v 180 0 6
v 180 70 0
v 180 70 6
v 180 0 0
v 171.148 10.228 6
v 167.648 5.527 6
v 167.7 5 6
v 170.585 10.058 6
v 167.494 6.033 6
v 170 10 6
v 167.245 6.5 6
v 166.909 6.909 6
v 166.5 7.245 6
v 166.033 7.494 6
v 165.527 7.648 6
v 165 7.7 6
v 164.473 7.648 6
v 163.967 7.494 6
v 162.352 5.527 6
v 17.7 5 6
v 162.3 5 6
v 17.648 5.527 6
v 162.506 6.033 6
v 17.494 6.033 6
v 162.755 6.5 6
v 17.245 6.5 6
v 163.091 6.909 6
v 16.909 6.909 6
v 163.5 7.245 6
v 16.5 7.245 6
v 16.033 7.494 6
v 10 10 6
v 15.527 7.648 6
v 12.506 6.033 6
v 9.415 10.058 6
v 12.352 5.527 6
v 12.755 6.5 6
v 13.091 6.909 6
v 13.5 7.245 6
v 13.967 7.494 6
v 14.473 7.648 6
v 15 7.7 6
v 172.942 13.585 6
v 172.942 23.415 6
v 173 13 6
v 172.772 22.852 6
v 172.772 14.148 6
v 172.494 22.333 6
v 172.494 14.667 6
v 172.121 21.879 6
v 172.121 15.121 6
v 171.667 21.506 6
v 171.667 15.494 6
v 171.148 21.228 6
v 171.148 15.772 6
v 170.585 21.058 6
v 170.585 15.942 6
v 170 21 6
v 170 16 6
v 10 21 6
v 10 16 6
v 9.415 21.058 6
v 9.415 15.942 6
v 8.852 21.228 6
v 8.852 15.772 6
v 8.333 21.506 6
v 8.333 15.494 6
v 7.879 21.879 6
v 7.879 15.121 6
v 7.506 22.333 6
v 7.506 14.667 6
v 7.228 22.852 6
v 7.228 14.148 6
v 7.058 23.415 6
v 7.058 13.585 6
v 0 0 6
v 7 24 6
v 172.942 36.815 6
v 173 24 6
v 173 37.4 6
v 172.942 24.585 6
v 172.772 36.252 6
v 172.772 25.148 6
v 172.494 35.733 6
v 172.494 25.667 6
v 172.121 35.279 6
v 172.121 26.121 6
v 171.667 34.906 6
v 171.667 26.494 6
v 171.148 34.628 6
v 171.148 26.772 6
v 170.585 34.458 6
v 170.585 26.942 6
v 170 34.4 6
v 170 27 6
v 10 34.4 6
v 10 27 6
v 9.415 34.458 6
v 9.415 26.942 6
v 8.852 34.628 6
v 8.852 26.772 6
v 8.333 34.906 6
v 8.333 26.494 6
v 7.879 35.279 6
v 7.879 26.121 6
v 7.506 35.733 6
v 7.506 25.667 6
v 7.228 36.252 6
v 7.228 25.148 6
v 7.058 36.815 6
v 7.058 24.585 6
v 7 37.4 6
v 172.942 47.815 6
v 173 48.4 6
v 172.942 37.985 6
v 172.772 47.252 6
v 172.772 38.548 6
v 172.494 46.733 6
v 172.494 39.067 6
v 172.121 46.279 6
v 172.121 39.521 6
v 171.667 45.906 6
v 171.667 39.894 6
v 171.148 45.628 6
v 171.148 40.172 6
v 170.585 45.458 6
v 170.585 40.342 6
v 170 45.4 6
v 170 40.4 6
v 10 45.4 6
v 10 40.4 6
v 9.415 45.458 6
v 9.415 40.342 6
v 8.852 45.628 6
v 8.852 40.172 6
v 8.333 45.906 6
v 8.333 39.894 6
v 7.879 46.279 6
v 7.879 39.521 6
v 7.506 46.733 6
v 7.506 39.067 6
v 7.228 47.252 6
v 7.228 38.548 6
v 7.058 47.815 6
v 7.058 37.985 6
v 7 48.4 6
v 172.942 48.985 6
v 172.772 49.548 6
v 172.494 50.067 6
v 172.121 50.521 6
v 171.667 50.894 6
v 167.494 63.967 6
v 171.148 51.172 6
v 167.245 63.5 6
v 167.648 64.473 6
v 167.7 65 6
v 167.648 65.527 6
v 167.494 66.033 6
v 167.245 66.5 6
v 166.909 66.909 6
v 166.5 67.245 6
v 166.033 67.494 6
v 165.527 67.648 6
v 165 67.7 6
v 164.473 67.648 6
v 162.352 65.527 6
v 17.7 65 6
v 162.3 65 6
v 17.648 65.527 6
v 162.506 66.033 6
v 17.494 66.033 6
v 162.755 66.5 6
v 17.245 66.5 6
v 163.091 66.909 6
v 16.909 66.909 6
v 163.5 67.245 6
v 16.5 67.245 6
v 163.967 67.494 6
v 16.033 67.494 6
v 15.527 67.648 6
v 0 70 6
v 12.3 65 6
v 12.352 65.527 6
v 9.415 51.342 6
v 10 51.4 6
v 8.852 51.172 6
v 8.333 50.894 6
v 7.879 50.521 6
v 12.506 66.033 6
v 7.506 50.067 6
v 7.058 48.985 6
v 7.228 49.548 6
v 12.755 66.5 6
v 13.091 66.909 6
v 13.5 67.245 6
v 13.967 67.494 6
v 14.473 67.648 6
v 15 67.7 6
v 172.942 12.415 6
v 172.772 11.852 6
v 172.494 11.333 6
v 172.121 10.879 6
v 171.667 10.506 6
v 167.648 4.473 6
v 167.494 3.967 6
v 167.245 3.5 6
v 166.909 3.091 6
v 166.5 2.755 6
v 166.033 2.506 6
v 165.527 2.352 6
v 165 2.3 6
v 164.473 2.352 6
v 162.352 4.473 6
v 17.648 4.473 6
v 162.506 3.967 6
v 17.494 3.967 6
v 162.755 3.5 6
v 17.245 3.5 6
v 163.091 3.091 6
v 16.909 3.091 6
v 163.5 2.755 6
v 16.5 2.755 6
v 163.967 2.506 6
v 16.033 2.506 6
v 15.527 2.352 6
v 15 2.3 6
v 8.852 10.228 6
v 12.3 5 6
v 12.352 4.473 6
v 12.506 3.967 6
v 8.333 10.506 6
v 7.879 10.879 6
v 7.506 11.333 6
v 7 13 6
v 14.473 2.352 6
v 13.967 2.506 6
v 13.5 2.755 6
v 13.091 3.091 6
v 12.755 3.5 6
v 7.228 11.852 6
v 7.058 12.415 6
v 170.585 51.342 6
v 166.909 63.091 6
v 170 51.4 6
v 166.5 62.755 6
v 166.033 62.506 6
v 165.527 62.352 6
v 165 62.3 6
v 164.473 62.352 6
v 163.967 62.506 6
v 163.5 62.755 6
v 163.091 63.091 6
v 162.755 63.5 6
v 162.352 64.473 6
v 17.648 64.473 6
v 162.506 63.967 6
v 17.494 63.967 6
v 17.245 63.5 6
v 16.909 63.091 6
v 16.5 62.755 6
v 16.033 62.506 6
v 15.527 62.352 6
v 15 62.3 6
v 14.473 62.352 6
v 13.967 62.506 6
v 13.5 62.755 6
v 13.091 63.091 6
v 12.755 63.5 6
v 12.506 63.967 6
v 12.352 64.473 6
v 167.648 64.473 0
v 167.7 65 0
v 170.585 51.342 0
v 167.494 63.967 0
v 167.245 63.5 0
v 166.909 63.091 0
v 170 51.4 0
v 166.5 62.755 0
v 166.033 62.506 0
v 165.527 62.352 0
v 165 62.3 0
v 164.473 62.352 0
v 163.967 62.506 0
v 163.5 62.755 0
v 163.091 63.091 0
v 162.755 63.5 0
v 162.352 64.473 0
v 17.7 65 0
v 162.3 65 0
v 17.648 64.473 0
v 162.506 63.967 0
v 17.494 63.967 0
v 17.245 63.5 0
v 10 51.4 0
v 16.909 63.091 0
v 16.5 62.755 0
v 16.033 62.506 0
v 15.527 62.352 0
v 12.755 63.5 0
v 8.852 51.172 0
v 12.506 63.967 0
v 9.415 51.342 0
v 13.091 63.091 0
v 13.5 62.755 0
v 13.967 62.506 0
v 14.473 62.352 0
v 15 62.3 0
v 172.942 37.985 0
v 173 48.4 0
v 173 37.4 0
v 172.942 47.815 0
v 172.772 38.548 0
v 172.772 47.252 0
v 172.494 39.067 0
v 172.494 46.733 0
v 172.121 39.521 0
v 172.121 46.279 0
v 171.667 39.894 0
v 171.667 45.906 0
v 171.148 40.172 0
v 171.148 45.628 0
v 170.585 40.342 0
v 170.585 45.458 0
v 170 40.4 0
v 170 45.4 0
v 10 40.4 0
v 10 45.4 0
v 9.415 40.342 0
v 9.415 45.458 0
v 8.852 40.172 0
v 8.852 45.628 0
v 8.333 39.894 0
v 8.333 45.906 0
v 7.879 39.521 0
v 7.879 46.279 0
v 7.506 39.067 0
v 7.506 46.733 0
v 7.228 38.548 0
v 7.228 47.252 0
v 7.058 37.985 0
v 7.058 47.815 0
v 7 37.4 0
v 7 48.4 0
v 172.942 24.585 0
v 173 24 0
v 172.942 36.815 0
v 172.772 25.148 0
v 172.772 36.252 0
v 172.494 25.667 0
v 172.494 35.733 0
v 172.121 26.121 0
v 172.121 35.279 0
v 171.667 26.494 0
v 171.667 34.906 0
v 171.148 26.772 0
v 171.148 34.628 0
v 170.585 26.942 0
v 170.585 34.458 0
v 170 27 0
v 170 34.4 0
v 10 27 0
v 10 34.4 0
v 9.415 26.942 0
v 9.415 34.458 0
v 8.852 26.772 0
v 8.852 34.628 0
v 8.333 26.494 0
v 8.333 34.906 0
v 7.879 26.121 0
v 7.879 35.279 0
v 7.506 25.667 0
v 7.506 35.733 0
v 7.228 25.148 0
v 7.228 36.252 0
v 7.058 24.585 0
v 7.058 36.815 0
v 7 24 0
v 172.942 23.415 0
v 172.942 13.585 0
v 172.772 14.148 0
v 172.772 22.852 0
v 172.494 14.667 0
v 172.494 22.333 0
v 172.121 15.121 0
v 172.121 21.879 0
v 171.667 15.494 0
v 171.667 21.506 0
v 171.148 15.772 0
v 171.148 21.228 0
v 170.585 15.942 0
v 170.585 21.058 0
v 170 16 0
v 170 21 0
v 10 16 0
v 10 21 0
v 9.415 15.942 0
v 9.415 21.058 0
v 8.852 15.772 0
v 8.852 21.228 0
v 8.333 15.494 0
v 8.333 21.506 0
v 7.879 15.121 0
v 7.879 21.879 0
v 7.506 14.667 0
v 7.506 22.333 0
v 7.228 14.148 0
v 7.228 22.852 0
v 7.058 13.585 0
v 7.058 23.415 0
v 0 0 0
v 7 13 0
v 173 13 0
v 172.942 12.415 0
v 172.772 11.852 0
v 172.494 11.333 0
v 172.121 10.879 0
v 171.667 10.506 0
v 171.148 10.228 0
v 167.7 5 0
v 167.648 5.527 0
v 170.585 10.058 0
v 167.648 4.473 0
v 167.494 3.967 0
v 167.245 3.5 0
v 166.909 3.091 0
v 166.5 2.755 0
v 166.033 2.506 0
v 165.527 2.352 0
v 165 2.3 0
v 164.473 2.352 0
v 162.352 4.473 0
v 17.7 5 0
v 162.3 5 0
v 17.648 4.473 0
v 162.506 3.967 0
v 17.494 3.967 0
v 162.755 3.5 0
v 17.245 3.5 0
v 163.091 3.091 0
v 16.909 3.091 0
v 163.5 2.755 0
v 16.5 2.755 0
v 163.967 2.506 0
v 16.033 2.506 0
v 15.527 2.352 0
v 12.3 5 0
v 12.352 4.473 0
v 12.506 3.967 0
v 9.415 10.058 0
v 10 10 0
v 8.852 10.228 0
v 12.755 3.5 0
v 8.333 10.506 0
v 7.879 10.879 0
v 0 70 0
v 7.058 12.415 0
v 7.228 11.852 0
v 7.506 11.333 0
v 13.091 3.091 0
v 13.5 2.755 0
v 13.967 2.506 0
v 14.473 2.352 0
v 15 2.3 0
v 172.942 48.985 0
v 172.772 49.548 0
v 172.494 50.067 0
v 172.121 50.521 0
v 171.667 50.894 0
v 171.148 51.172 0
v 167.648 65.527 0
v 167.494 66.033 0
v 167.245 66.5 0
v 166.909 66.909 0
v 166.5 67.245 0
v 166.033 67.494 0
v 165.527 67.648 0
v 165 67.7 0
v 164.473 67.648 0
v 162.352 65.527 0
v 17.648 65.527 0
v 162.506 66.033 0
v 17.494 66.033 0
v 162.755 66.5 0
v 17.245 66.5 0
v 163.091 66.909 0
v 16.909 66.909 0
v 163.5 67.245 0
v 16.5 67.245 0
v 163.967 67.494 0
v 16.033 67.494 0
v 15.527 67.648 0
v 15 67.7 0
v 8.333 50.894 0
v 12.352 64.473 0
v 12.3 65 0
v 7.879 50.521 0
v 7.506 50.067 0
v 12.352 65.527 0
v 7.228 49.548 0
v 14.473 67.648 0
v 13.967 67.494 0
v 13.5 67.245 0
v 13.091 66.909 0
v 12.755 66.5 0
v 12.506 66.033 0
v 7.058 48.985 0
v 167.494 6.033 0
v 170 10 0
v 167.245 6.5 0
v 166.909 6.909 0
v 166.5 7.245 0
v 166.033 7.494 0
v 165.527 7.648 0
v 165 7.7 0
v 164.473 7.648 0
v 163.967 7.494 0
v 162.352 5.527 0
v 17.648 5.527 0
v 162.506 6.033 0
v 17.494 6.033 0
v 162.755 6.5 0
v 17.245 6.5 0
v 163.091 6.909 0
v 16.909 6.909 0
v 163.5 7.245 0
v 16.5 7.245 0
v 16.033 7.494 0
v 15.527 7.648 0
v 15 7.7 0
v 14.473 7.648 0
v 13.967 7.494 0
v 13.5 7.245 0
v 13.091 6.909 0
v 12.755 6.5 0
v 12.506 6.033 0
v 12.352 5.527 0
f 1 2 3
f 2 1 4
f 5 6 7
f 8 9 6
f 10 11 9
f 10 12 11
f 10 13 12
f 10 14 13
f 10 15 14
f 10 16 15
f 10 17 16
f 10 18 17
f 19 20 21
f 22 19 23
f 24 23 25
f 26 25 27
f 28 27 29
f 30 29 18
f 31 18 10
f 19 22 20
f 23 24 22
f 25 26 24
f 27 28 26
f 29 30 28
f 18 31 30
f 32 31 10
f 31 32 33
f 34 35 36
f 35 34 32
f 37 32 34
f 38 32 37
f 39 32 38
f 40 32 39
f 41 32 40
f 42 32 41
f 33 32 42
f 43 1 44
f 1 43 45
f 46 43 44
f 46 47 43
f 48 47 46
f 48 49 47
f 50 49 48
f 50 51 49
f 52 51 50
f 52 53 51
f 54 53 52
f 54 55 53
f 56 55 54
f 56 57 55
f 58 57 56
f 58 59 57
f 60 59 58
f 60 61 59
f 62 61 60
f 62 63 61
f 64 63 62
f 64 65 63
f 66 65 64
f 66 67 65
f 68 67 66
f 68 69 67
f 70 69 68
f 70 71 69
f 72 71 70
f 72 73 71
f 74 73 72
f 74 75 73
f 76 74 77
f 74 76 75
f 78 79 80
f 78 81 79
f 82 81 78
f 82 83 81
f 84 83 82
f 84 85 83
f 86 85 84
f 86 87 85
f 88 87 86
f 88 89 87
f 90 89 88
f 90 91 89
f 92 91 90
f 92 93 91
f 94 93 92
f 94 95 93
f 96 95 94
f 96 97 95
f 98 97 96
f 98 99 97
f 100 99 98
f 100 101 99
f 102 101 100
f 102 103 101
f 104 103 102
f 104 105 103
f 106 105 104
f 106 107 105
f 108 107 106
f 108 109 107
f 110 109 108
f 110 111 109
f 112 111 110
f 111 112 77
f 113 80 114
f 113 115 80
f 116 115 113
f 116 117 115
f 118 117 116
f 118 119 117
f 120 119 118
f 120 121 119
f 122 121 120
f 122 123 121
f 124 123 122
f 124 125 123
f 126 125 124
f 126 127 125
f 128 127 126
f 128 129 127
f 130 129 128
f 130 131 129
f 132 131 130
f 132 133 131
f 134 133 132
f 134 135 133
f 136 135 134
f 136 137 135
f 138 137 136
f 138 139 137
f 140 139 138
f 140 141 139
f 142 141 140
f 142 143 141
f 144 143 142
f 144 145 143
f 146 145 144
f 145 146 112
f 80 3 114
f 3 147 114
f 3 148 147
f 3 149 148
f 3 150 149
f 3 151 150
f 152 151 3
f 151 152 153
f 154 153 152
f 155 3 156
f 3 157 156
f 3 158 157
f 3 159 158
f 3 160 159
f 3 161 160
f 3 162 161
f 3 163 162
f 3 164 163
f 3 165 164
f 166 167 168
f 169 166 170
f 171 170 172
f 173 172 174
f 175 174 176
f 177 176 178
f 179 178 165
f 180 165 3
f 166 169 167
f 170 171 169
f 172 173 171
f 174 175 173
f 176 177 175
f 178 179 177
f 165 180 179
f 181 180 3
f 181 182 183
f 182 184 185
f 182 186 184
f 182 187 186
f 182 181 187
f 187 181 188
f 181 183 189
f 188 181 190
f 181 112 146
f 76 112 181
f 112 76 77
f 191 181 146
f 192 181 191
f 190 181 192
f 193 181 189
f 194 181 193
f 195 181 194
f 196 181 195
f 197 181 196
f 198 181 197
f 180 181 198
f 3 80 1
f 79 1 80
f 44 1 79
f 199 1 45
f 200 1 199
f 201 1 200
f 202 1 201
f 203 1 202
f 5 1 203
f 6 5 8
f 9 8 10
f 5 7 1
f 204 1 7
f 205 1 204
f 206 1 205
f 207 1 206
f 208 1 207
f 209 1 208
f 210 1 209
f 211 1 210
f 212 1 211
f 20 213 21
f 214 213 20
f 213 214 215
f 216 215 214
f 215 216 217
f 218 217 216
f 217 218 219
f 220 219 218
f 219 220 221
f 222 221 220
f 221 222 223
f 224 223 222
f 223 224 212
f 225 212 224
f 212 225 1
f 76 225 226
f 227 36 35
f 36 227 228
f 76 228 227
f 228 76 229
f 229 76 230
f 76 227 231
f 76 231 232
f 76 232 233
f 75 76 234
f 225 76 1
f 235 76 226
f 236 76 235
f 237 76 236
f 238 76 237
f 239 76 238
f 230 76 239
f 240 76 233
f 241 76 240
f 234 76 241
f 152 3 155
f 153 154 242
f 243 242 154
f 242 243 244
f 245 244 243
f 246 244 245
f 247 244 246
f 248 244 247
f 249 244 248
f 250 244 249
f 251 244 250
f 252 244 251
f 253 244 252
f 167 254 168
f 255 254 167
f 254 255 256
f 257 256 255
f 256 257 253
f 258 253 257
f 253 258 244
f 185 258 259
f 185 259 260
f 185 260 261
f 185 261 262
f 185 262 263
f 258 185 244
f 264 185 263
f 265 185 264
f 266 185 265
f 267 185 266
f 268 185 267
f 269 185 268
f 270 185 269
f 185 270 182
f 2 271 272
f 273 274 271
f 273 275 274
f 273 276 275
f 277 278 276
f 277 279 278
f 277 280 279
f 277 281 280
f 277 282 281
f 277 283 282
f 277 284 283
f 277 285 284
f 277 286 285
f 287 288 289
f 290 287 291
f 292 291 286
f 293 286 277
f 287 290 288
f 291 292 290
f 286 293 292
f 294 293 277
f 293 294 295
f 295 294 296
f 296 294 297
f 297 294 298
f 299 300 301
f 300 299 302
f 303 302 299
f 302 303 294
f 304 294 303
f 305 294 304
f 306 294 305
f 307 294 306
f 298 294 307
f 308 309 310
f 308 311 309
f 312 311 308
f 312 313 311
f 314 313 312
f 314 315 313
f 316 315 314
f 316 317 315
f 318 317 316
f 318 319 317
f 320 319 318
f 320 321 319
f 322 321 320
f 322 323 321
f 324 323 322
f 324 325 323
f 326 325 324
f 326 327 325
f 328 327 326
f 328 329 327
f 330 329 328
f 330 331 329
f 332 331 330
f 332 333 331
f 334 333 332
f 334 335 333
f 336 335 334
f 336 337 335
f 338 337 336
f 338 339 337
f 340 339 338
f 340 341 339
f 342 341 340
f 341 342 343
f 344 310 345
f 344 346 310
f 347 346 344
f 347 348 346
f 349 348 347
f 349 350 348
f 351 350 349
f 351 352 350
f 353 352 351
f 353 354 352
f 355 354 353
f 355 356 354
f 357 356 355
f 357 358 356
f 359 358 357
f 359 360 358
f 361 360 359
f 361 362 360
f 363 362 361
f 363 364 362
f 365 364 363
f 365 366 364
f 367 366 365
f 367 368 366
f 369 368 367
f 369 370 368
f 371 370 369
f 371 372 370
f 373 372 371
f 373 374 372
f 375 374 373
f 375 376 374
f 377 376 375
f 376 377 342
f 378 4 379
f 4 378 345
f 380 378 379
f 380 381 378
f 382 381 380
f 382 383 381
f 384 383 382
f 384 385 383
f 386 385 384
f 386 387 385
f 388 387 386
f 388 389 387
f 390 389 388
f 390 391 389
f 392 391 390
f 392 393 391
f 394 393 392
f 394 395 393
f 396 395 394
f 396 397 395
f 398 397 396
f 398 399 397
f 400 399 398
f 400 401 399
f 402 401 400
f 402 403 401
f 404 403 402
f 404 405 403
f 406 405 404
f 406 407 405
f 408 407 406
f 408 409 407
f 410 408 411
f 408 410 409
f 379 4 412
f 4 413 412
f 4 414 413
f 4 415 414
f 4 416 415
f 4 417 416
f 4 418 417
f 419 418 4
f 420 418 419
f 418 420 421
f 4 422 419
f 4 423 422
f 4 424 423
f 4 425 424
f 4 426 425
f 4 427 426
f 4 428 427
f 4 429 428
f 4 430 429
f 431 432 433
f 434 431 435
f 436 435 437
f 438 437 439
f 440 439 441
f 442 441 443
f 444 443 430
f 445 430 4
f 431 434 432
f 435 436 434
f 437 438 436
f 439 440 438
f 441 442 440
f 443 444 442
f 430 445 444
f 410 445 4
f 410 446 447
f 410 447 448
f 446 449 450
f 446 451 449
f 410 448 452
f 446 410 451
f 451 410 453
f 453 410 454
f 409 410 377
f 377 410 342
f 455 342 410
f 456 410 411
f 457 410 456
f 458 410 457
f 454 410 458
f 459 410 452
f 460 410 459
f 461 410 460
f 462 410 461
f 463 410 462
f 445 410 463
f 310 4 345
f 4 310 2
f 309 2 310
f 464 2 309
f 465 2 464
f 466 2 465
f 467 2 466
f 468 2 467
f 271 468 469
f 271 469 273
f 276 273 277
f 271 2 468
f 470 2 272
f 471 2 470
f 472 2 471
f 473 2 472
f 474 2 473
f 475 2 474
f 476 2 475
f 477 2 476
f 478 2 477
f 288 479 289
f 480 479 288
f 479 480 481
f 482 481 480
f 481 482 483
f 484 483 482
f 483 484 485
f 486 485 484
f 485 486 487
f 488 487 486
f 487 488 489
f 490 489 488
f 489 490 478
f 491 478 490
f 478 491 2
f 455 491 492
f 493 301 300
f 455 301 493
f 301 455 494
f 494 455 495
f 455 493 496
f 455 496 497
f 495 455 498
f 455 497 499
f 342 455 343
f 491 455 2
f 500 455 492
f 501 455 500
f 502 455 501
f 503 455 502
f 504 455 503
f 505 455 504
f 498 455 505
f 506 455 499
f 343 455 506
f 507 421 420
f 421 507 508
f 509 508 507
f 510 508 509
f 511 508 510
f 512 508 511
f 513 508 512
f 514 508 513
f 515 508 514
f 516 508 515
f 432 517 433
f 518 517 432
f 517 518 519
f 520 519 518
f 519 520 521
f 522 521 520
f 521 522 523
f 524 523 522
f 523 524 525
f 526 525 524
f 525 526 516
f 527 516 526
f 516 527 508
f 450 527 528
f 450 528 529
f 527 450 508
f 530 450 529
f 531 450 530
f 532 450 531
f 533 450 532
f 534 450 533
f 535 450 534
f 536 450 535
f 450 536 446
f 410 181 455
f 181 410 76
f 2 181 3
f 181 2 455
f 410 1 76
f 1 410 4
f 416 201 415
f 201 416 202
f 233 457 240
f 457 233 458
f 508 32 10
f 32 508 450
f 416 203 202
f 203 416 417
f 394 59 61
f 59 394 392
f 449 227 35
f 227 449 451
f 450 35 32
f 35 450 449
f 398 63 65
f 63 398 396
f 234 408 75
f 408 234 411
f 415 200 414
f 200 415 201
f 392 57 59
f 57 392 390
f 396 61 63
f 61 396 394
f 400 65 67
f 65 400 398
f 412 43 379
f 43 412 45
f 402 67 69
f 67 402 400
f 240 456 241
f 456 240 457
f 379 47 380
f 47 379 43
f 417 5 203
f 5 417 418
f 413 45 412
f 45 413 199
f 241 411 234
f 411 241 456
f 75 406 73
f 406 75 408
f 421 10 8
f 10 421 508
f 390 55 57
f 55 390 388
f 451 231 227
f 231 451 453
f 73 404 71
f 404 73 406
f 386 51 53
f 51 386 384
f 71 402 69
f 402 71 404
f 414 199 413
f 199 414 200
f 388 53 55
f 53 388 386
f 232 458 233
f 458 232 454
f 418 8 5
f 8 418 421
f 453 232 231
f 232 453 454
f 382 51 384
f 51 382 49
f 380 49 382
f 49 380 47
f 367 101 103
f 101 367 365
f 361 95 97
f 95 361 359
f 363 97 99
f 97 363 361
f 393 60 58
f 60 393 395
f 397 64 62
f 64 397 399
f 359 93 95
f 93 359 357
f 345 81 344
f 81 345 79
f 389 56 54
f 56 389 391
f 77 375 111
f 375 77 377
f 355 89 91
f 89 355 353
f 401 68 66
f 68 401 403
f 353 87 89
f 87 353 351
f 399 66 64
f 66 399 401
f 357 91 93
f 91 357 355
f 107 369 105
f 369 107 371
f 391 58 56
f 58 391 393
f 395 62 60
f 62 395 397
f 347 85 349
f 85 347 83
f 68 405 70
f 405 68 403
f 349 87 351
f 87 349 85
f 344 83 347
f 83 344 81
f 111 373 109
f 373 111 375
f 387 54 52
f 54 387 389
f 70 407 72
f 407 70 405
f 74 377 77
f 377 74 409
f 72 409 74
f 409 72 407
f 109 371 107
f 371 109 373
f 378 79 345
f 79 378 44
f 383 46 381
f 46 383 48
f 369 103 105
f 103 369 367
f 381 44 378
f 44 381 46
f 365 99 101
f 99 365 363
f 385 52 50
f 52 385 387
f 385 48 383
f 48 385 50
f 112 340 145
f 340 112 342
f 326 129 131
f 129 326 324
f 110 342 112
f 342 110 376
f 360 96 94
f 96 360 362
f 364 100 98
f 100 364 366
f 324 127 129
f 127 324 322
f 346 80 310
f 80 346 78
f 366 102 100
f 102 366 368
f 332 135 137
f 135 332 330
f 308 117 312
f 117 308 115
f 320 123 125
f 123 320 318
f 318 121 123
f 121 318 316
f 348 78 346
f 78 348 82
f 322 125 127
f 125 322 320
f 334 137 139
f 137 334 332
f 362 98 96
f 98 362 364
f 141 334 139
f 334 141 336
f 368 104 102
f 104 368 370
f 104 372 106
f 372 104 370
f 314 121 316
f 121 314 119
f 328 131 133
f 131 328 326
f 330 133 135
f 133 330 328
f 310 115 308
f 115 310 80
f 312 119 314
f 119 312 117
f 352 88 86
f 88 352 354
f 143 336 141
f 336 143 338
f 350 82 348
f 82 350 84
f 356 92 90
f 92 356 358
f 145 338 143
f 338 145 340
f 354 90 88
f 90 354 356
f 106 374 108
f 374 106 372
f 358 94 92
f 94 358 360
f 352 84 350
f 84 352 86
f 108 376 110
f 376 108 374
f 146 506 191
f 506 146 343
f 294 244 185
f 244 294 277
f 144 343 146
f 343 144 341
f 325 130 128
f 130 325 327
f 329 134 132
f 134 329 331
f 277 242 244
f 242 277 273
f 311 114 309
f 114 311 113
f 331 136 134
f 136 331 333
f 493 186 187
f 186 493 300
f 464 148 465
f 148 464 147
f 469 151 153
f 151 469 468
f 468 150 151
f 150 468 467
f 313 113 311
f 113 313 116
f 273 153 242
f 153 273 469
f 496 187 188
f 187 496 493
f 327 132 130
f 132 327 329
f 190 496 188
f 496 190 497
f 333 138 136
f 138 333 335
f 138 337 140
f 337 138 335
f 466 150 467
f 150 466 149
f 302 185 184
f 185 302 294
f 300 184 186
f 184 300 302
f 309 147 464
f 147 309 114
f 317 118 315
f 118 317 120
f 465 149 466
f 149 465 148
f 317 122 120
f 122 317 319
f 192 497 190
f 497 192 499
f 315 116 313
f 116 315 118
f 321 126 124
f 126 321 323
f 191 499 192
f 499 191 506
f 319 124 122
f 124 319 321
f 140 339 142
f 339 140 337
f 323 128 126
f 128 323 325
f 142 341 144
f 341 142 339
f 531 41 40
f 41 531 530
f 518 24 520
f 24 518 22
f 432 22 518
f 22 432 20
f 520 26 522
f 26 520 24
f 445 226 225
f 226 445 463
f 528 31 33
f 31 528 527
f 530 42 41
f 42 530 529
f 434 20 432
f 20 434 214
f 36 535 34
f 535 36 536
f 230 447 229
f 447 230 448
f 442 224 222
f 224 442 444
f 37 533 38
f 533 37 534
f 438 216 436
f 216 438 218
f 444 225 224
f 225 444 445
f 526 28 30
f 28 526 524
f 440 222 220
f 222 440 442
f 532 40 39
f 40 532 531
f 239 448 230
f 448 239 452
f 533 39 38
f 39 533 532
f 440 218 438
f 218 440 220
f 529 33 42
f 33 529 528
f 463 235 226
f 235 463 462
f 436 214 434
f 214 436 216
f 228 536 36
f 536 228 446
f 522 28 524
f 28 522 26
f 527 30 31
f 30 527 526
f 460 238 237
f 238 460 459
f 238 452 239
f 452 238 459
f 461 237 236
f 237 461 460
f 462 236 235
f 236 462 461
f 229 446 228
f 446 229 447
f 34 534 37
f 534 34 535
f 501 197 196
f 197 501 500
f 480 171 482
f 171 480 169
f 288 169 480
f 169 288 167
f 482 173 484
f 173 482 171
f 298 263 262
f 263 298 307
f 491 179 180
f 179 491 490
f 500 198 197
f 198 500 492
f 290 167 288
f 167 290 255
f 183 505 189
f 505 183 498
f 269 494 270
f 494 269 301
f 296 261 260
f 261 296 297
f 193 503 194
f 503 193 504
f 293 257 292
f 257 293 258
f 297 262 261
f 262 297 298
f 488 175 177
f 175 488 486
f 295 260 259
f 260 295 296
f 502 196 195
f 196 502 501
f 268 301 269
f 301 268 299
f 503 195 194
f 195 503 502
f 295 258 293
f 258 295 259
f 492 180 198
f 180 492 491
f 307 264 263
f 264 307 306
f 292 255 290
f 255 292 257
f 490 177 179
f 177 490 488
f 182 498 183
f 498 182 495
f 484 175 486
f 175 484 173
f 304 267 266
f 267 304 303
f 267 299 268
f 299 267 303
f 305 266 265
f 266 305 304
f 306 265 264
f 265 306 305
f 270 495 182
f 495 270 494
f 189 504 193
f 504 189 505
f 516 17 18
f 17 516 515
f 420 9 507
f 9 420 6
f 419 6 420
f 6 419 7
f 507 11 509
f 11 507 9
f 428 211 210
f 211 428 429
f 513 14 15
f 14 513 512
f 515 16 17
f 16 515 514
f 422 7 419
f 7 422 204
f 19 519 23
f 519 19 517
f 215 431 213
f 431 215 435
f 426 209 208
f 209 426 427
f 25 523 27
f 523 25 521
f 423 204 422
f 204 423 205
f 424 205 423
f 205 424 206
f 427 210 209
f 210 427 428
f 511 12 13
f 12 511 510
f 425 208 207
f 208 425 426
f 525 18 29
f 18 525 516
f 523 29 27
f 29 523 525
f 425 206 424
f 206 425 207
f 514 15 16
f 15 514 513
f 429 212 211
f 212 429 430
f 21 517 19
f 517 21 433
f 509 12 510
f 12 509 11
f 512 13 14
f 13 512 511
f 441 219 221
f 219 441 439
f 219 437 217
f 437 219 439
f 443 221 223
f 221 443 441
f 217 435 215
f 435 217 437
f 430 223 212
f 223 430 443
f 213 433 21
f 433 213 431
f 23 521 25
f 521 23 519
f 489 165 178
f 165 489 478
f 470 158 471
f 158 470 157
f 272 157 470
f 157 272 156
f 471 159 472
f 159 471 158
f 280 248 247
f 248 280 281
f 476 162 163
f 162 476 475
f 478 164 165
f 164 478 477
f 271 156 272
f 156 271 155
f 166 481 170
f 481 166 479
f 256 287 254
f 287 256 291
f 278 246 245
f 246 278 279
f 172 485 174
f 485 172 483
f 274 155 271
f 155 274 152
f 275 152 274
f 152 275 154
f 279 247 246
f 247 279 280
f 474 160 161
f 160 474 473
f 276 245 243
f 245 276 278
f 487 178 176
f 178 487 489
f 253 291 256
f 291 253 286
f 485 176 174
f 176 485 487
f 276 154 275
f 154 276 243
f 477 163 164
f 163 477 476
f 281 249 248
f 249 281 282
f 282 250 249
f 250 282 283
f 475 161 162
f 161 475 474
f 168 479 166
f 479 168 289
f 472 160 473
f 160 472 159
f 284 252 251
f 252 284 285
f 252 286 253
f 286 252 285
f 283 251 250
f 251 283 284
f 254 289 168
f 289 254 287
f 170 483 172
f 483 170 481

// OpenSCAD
$fn = 32;

// ----------------------------------------------------------------------
// Slotted panel: 180 x 70 mm, 4 ряда of slots
// ----------------------------------------------------------------------

// --- parameters (mm) ---
panel_w = 180;            // panel width
panel_d = 70;             // panel depth
thick = 6;                // panel thickness
slot_w = 6;               // slot width
pitch0 = 11;              // first row pitch
pitch_step = 2.4;         // pitch increase per row
margin = 10;              // margin around the slot field
rows = 4;                 // number of slot rows
mount_d = 5.4;            // mounting holes
mount_x = 75;             // mounting hole offset

difference() {
  union() {
    cube([panel_w, panel_d, thick]);
  }
  /* slot rows: stadium shaped cutters, 2.5 mm clear of both faces */
  /* row 0: pitch 11, length 160 */
  hull() {
    translate([10, 13, -2.5]) cylinder(h = thick + 5, d = slot_w);
    translate([170, 13, -2.5]) cylinder(h = thick + 5, d = slot_w);
  }
  /* row 1: pitch 13.4, length 160 */
  hull() {
    translate([10, 24, -2.5]) cylinder(h = thick + 5, d = slot_w);
    translate([170, 24, -2.5]) cylinder(h = thick + 5, d = slot_w);
  }
  /* row 2: pitch 11, length 160 */
  hull() {
    translate([10, 37.4, -2.5]) cylinder(h = thick + 5, d = slot_w);
    translate([170, 37.4, -2.5]) cylinder(h = thick + 5, d = slot_w);
  }
  /* row 3: pitch 13.4, length 160 */
  hull() {
    translate([10, 48.4, -2.5]) cylinder(h = thick + 5, d = slot_w);
    translate([170, 48.4, -2.5]) cylinder(h = thick + 5, d = slot_w);
  }
  translate([15, 5, -2.5]) cylinder(h = 11, d = mount_d);
  translate([15, 65, -2.5]) cylinder(h = 11, d = mount_d);
  translate([165, 5, -2.5]) cylinder(h = 11, d = mount_d);
  translate([165, 65, -2.5]) cylinder(h = 11, d = mount_d);
}
